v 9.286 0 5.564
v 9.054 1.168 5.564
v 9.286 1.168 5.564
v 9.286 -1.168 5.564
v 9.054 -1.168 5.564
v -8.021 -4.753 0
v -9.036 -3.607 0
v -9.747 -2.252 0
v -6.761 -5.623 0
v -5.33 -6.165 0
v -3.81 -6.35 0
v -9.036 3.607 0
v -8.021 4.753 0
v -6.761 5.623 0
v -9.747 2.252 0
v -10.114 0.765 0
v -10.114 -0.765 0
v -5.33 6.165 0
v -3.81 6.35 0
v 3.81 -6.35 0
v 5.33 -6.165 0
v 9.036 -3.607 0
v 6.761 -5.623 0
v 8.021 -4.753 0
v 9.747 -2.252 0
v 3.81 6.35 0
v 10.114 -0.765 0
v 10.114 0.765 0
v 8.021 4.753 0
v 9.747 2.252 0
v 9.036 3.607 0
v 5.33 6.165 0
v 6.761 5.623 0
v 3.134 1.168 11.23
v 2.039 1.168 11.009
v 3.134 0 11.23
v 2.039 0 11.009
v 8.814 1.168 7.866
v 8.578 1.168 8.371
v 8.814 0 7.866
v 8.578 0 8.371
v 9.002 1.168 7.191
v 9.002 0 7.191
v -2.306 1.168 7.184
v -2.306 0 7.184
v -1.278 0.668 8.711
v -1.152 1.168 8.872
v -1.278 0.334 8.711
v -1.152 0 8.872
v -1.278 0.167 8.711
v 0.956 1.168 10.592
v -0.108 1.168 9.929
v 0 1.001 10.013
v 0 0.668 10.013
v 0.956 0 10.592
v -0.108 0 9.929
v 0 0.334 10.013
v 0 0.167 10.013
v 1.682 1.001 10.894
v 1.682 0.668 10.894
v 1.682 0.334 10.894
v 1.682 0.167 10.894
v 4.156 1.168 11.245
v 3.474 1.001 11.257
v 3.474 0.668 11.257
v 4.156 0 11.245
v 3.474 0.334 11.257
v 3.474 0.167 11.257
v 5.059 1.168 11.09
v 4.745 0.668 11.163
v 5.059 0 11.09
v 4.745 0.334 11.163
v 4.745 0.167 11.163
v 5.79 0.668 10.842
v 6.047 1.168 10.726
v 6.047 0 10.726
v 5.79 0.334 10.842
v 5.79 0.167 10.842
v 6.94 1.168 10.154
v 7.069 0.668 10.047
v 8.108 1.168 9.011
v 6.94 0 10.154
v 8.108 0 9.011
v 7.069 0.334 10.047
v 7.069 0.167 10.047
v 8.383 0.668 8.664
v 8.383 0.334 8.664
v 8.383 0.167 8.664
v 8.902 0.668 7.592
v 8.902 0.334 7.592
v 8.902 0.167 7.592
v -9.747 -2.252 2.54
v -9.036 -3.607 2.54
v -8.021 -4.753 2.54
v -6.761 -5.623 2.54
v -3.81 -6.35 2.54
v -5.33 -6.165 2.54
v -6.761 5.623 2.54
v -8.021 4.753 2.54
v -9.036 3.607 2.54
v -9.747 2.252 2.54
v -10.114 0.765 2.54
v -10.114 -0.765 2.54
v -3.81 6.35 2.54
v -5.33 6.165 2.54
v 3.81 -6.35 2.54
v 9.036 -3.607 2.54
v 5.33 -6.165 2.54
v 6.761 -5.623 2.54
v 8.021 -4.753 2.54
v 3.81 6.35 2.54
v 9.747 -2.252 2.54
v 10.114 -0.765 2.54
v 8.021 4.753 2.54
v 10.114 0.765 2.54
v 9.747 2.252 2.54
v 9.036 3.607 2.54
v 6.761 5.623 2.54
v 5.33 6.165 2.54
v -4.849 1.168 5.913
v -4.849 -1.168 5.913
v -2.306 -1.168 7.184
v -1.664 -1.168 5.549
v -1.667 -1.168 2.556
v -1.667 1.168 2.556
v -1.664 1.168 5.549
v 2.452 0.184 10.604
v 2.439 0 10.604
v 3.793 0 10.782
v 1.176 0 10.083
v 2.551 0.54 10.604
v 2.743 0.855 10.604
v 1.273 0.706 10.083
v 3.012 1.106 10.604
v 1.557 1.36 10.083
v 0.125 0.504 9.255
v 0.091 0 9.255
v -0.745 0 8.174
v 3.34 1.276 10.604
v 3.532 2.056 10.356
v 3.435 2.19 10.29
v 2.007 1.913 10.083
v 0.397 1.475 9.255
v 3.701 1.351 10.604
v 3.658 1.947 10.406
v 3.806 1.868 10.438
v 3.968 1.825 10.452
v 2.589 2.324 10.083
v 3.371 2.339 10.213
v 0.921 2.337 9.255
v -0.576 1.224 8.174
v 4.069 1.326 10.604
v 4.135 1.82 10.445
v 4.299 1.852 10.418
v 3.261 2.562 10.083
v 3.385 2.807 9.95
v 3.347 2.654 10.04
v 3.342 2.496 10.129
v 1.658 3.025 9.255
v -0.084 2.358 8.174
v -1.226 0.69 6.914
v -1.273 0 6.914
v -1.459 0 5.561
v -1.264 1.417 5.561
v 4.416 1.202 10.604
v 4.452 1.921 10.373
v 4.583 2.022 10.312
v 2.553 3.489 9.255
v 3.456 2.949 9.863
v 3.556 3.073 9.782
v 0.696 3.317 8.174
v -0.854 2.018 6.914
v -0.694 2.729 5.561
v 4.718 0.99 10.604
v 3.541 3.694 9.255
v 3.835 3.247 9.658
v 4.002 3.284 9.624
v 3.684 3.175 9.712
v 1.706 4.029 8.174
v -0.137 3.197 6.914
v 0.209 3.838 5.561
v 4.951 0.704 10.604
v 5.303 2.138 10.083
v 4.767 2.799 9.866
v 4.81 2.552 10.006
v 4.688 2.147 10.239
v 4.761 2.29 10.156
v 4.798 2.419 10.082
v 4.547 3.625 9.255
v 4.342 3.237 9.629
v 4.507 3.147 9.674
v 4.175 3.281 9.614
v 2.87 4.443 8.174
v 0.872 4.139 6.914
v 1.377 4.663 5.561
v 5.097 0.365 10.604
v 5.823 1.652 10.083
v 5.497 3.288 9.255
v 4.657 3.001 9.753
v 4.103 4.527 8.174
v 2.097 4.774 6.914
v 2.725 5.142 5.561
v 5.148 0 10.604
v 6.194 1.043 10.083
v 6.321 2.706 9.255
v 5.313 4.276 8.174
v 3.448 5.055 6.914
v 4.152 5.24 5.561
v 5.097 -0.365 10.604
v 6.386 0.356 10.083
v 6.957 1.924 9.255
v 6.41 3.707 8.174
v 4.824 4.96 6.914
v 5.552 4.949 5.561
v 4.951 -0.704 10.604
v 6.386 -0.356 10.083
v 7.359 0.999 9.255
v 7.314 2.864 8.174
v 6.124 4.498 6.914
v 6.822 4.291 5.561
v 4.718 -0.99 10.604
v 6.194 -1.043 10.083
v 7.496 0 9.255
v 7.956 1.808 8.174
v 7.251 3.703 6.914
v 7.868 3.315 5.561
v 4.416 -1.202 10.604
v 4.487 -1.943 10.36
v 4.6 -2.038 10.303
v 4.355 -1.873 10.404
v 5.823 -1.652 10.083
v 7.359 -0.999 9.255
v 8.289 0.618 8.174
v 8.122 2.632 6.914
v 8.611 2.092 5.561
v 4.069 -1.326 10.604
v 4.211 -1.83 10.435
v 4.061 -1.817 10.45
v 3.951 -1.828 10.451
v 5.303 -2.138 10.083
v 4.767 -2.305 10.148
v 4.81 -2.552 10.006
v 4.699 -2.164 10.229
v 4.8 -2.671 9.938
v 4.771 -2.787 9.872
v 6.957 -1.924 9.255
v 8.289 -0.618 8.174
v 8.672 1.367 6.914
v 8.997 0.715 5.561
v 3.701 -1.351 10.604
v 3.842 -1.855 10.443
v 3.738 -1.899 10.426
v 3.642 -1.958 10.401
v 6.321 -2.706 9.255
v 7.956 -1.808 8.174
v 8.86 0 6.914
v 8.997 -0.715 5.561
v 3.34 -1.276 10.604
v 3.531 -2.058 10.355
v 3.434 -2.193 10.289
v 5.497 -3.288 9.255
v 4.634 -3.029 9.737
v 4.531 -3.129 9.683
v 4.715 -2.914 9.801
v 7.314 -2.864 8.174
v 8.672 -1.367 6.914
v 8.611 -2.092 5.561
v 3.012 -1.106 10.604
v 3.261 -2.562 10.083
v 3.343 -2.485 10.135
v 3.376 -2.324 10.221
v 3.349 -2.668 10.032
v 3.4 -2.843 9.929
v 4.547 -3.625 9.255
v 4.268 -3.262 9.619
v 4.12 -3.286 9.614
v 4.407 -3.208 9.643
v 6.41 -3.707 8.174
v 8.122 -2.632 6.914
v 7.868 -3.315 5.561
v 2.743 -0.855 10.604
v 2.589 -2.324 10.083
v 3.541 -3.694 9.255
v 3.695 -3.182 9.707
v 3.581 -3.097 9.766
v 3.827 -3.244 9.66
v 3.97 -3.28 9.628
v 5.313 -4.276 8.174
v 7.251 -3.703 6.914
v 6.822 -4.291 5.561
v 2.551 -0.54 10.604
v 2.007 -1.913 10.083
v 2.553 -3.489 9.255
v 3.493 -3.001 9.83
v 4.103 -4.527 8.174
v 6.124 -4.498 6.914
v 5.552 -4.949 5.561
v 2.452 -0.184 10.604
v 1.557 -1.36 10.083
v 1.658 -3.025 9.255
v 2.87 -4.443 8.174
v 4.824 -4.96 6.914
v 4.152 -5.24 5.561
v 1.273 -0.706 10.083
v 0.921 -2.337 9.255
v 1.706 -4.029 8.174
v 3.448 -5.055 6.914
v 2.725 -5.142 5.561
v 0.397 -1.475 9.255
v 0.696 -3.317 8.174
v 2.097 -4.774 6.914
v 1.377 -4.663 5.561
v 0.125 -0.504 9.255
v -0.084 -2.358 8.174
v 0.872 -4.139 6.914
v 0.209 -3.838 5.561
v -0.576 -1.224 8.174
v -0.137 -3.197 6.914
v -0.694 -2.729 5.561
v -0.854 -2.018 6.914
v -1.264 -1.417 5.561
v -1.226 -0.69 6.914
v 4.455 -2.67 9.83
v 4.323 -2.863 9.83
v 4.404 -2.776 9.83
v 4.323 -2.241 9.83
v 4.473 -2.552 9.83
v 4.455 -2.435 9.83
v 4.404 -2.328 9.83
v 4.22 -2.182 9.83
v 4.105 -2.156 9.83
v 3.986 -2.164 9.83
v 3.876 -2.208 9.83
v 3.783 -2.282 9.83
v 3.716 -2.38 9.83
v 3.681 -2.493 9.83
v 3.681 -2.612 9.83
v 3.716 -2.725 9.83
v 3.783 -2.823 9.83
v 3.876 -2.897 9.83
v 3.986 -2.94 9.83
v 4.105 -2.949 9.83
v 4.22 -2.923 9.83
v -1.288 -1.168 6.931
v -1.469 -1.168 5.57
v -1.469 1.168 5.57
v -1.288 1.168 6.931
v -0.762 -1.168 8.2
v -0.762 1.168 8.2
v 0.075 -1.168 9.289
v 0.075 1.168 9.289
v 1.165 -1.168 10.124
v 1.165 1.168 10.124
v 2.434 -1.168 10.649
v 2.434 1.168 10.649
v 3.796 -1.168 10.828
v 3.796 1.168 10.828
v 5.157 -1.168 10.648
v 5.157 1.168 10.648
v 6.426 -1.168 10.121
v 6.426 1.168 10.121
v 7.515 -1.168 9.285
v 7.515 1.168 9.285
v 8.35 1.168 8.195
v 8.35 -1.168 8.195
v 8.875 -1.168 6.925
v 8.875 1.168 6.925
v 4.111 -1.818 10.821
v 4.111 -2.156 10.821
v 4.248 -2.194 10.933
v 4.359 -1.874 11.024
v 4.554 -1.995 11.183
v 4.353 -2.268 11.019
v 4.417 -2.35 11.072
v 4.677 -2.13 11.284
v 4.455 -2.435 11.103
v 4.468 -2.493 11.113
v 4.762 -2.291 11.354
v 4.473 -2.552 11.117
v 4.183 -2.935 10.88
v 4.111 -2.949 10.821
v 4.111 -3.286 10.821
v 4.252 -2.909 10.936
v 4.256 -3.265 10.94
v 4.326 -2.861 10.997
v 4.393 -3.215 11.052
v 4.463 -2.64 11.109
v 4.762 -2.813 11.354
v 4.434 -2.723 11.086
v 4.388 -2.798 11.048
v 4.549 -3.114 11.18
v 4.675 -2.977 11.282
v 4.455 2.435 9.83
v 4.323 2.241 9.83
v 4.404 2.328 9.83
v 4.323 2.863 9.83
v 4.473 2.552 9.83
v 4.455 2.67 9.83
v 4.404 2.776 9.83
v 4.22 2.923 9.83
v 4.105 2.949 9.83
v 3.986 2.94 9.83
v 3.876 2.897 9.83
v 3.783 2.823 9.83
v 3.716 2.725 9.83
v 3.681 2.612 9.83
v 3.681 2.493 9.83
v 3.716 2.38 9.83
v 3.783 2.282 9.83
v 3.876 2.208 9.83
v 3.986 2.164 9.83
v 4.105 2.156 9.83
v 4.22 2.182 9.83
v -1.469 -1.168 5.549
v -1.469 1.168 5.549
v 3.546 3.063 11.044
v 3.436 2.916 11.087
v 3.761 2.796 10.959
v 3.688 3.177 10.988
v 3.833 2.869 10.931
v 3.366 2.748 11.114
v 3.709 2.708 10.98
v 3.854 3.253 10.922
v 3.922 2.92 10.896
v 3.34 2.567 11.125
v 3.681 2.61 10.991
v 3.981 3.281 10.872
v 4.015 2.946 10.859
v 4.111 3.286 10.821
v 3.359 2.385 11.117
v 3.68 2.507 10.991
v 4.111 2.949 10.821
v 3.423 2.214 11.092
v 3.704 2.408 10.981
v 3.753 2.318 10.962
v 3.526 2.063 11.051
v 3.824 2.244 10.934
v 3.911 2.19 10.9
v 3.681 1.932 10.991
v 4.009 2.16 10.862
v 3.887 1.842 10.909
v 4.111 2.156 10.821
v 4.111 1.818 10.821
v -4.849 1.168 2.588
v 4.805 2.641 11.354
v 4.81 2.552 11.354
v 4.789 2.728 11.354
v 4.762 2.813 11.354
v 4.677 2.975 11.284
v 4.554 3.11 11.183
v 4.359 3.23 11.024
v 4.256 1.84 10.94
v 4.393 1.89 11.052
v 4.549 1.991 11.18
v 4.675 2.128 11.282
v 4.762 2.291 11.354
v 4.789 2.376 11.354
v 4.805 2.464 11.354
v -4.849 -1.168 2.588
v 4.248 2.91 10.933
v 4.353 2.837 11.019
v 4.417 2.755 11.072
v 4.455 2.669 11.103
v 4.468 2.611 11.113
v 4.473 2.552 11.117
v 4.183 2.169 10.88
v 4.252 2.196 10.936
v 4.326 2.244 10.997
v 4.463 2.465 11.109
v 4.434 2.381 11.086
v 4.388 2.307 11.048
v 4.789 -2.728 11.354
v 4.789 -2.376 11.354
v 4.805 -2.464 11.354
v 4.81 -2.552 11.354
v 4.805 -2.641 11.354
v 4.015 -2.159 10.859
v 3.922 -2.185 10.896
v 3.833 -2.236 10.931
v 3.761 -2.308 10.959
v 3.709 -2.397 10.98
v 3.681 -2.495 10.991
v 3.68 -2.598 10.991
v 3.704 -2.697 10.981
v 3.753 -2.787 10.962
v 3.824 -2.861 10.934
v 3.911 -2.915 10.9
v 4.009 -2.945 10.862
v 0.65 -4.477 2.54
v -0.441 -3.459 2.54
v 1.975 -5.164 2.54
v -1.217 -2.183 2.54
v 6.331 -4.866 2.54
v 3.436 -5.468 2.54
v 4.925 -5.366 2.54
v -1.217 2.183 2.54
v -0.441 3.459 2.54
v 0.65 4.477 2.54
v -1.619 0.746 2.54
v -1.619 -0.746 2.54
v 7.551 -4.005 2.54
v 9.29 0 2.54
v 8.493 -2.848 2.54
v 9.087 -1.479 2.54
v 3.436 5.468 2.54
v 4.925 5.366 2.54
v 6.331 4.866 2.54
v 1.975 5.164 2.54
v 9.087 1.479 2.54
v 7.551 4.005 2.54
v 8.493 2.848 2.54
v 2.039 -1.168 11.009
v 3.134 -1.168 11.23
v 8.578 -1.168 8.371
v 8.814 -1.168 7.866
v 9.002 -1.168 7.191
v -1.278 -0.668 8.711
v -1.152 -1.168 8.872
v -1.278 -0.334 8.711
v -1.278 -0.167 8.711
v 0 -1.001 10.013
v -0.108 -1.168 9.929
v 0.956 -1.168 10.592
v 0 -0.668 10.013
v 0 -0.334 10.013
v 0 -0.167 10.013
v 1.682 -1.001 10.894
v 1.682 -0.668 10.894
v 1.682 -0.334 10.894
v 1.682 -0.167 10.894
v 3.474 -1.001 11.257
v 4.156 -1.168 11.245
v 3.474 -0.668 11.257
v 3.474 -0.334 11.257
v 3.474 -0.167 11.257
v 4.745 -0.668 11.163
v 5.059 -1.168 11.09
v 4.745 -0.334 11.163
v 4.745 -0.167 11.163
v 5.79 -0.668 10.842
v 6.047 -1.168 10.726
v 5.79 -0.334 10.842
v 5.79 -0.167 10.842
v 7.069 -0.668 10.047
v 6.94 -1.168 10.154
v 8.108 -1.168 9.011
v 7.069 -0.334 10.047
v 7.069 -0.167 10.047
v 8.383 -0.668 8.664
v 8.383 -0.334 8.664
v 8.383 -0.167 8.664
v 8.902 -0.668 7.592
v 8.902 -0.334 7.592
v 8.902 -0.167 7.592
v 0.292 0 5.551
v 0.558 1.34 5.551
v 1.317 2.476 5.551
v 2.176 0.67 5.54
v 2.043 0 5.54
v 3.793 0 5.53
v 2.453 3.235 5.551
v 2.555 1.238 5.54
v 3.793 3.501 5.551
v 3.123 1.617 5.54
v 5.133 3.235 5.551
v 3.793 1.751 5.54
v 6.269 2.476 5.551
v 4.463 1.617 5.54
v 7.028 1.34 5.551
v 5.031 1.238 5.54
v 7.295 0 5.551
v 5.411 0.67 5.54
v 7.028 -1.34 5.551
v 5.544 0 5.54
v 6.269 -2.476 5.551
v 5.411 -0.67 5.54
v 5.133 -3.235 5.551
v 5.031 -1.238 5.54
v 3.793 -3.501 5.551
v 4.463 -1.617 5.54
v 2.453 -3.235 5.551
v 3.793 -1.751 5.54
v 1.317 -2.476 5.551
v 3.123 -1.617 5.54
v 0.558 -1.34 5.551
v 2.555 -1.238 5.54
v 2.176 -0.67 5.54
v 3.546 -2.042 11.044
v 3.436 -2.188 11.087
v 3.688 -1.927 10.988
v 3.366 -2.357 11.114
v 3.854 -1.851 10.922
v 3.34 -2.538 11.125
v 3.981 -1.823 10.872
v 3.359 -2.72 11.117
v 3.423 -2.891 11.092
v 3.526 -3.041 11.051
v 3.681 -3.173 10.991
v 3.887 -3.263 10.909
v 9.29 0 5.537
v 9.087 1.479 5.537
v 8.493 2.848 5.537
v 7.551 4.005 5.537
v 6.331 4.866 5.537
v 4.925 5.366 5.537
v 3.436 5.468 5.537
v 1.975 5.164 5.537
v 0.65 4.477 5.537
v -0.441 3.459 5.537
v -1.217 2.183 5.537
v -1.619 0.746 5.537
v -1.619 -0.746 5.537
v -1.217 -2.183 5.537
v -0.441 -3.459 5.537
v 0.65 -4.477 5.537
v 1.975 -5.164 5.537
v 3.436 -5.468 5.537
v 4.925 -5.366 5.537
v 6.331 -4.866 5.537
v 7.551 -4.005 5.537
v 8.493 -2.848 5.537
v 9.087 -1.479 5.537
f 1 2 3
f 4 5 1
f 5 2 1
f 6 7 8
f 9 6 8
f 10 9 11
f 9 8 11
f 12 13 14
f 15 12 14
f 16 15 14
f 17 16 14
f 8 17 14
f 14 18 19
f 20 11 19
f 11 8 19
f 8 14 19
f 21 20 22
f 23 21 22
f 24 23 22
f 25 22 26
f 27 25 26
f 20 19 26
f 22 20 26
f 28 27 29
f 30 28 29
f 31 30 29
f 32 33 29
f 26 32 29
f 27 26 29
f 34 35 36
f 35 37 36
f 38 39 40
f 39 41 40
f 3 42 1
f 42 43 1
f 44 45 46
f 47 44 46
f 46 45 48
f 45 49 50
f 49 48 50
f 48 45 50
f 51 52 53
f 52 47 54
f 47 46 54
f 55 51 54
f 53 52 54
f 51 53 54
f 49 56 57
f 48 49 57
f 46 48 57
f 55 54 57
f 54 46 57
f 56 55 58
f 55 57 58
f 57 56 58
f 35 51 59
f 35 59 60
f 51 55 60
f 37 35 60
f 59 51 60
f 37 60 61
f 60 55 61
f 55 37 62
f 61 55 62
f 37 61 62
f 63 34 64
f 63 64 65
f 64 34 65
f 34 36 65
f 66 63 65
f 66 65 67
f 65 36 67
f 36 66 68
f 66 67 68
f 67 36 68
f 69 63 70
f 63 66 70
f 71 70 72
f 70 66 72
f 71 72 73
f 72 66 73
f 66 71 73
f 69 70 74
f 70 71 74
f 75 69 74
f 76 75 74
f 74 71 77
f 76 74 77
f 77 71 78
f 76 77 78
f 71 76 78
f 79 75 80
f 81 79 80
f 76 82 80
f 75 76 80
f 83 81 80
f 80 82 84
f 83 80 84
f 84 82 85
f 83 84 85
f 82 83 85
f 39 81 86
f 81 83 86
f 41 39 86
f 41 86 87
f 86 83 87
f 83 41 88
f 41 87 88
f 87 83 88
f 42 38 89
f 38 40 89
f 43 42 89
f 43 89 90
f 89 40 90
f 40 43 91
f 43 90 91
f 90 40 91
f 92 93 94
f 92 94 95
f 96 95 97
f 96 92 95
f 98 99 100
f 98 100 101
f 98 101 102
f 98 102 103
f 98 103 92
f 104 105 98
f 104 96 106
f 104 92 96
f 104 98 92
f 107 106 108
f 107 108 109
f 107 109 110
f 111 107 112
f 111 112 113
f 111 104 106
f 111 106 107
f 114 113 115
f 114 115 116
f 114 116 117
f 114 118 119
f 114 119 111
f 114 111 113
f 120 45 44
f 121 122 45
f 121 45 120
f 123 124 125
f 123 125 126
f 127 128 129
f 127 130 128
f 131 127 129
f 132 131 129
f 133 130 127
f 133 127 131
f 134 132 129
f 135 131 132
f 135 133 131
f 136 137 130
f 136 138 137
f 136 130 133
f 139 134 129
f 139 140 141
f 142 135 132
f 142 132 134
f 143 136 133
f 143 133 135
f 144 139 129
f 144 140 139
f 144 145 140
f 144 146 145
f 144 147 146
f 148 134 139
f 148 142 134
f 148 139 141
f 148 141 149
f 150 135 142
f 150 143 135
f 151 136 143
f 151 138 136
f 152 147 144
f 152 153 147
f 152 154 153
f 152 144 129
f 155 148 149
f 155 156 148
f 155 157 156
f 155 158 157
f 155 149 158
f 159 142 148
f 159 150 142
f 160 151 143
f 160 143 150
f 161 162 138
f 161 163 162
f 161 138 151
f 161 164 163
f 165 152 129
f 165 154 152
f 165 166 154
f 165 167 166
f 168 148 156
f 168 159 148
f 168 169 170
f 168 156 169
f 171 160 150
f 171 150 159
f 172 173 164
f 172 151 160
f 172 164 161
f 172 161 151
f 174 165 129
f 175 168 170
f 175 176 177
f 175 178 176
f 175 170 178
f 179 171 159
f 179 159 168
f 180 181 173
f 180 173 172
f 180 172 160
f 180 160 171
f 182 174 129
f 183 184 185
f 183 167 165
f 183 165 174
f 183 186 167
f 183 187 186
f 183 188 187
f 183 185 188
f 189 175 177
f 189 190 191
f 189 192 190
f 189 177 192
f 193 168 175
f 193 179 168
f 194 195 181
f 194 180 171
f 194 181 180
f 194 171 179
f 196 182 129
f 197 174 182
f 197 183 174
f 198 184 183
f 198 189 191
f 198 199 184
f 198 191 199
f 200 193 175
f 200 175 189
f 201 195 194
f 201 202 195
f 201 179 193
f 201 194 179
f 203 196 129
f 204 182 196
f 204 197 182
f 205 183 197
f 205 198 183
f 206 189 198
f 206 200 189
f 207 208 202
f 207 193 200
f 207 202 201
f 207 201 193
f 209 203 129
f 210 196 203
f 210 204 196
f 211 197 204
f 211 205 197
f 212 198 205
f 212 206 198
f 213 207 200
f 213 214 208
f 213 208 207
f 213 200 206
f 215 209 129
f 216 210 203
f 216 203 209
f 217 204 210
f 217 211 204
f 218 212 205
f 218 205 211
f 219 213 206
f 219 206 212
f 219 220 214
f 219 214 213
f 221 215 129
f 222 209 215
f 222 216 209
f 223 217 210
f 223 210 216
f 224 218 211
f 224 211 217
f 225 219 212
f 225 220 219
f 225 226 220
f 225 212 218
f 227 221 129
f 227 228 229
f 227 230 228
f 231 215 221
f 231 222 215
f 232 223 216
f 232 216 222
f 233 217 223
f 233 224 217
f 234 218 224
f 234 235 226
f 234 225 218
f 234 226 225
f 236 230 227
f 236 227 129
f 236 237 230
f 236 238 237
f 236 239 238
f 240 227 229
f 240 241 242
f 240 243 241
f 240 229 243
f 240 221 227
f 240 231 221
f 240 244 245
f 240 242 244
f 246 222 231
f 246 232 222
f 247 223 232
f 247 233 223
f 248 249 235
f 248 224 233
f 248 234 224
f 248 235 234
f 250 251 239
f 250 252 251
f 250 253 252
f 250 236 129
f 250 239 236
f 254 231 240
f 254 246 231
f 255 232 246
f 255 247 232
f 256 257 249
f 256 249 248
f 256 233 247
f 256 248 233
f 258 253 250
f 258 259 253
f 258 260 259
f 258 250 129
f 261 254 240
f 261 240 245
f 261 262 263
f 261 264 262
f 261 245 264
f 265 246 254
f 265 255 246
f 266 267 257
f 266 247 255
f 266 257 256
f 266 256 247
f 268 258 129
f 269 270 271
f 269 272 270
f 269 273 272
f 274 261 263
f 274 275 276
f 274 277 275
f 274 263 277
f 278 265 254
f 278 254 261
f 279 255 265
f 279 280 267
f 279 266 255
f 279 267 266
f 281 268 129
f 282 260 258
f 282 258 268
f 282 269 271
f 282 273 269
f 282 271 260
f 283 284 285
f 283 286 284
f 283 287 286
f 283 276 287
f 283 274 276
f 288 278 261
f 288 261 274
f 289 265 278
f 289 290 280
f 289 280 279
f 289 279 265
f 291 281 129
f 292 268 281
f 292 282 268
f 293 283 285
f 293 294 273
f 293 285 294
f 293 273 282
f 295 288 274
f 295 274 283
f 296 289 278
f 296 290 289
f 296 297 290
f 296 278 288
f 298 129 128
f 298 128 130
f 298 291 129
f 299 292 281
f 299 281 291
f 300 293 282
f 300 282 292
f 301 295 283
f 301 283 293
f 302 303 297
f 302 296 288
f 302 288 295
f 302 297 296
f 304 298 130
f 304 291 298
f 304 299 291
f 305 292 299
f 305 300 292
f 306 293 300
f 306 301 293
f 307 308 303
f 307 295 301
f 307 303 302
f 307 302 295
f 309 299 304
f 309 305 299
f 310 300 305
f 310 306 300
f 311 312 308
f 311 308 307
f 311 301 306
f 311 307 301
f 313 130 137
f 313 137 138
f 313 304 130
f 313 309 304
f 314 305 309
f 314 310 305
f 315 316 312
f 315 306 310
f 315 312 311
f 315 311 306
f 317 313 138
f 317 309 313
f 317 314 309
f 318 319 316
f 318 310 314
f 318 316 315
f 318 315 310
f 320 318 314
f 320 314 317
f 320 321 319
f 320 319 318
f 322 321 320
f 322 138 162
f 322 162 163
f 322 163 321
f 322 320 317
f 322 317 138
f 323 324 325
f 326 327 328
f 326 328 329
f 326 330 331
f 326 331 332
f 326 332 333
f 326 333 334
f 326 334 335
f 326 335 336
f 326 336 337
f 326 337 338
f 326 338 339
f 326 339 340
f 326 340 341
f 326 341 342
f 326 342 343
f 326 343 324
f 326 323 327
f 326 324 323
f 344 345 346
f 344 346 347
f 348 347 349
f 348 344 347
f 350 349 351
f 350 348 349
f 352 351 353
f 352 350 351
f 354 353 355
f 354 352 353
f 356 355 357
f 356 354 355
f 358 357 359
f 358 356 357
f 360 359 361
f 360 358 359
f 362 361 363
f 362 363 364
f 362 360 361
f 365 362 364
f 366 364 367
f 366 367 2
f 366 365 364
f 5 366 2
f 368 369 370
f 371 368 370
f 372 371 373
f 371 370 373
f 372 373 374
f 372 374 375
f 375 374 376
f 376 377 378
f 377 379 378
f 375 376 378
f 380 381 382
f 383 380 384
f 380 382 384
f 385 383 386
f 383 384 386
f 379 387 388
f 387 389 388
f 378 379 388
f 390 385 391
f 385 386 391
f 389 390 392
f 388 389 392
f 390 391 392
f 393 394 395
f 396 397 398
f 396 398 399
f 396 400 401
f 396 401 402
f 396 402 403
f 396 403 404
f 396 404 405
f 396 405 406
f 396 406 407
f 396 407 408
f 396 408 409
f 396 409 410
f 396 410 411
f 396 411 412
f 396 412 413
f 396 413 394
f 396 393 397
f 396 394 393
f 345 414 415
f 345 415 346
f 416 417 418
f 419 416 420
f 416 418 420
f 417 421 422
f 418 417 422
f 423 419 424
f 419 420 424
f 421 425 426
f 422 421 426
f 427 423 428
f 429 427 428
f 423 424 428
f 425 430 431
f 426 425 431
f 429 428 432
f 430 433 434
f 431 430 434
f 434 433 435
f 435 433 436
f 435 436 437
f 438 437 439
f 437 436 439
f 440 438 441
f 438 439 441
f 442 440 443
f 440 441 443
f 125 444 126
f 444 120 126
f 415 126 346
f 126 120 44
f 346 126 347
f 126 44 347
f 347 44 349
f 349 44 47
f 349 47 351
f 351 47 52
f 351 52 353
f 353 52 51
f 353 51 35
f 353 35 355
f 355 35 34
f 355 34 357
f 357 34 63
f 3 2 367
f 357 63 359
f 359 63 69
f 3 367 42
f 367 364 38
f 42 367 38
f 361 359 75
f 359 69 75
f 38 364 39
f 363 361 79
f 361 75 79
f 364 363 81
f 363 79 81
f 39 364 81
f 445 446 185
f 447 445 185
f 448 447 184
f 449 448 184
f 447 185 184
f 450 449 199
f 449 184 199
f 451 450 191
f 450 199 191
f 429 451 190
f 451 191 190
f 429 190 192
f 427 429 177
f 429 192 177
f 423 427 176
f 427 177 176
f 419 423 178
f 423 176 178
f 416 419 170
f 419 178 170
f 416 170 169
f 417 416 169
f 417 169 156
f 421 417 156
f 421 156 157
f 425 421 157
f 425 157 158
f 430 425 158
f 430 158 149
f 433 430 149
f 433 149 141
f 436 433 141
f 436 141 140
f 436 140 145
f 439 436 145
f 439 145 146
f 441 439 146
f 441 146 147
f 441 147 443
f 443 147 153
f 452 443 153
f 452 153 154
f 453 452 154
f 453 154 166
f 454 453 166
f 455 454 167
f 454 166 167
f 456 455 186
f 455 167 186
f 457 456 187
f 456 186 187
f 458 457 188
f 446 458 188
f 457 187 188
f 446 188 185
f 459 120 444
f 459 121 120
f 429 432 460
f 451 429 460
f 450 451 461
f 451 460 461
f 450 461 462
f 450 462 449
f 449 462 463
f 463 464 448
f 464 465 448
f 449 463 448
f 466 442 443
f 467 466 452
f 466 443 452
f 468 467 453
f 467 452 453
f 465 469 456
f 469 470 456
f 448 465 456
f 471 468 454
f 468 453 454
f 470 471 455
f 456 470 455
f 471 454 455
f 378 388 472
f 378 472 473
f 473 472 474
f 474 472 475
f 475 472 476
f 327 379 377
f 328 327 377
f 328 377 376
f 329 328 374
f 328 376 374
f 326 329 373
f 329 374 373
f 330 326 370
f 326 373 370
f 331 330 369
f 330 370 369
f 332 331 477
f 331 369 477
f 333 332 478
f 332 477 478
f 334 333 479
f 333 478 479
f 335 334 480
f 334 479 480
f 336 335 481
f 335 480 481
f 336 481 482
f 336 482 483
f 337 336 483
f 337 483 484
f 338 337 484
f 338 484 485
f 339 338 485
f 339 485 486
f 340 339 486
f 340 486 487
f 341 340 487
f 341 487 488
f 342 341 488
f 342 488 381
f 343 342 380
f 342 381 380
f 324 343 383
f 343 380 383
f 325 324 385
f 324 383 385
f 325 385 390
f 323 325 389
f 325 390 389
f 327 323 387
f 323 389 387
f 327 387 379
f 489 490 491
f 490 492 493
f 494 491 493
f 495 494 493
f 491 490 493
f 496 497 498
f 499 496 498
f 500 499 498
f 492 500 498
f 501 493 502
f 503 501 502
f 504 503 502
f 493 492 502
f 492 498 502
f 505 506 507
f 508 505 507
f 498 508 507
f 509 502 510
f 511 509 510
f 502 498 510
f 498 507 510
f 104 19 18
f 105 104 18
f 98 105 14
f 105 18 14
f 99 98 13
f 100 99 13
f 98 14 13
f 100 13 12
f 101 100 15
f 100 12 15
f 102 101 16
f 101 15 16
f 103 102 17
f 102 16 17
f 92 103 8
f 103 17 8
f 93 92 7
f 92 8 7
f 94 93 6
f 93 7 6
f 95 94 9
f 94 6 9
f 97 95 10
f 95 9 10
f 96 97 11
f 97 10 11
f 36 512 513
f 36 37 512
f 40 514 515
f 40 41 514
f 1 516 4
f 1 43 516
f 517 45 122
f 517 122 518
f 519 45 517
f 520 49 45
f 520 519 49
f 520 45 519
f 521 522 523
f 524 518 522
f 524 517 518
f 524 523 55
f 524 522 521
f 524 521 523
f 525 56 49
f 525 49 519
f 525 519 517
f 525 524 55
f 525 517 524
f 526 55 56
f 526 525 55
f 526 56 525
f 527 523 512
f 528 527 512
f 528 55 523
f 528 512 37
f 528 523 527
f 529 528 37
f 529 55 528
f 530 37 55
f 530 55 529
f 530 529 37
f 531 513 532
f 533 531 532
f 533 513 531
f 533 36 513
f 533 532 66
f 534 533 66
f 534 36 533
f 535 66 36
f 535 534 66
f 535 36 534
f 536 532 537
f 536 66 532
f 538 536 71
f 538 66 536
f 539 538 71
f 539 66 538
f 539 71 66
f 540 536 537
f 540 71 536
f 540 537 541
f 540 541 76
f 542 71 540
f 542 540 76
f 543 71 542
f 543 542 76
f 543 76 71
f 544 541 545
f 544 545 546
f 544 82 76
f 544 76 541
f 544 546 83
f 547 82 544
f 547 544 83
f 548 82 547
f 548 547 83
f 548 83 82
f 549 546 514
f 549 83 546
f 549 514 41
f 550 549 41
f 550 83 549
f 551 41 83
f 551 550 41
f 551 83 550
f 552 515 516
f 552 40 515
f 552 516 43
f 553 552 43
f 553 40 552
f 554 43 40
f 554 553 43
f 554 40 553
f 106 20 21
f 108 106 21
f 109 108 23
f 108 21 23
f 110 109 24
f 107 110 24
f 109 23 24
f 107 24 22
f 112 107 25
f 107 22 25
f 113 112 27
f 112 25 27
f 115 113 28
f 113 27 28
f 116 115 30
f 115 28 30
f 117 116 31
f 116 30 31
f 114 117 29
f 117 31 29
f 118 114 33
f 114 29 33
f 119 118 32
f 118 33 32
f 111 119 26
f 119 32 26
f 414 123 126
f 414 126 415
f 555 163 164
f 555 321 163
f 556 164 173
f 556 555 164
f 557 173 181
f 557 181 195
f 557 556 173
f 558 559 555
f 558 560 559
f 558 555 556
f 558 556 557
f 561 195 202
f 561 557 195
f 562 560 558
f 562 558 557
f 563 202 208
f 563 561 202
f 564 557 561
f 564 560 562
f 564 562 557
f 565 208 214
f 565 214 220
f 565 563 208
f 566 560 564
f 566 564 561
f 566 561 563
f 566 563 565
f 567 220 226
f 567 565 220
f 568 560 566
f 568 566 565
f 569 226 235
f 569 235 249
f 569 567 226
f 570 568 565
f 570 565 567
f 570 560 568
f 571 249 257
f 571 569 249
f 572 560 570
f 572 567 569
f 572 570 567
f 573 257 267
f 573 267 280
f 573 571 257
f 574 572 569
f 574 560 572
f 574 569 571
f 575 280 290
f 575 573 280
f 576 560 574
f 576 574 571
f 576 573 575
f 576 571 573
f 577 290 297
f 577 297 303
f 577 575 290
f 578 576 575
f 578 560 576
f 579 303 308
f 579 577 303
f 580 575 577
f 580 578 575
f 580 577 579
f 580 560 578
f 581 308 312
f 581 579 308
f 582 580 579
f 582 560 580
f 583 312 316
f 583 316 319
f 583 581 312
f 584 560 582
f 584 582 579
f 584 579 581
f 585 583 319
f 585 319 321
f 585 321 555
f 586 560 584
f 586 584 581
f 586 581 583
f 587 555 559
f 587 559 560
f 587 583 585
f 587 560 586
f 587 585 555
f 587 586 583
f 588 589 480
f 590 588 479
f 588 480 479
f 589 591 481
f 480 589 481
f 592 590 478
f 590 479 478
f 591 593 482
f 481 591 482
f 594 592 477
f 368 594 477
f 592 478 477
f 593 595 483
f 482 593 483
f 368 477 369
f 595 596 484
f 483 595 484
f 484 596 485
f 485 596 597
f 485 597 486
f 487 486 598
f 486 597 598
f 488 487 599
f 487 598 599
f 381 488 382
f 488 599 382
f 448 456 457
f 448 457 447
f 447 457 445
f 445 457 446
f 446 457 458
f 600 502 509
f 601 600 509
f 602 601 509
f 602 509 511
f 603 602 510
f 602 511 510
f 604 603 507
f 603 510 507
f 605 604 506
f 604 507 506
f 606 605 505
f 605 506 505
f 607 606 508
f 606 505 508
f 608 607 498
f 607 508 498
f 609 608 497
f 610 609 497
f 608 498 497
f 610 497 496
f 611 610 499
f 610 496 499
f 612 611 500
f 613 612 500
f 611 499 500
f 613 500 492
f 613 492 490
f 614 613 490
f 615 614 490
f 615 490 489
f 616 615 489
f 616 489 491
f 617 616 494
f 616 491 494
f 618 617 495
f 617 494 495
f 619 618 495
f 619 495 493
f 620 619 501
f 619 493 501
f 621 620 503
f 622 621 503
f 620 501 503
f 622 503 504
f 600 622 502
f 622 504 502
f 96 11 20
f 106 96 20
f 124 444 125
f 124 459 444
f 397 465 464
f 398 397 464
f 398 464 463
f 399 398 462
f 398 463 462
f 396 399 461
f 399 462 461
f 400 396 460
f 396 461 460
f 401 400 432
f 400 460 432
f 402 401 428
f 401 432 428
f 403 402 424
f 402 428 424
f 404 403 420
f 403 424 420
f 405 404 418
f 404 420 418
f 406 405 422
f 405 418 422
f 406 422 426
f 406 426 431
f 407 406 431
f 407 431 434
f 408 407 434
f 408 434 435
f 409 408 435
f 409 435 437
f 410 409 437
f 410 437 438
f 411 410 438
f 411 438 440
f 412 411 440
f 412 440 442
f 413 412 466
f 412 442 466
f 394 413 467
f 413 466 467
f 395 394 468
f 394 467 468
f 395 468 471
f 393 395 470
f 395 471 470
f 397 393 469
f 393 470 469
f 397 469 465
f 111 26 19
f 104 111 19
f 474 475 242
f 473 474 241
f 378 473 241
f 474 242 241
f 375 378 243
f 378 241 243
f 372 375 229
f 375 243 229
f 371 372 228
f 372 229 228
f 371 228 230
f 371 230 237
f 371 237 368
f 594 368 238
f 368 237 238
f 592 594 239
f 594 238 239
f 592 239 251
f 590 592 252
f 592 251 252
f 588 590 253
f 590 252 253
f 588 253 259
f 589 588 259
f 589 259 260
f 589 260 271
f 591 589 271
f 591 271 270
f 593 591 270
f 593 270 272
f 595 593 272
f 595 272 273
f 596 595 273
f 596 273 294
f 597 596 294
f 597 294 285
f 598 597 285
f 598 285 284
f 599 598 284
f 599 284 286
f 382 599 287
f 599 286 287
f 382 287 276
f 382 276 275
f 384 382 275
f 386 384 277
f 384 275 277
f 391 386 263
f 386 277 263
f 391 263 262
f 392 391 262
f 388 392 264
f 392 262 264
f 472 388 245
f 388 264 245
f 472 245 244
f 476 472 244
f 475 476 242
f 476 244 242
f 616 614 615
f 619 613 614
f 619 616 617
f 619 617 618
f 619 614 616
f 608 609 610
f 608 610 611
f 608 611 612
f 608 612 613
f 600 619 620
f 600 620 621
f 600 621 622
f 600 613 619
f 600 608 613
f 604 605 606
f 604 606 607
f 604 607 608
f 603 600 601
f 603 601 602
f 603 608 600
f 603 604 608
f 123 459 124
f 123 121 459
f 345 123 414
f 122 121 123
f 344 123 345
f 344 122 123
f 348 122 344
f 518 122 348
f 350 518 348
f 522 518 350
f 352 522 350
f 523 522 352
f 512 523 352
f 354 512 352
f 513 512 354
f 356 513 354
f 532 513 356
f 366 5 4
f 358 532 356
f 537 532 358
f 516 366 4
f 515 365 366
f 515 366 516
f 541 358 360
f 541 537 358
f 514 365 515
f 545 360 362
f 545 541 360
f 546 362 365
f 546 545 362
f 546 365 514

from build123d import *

# Parameters (mm, degrees)
F1_DEPTH  = 2.54
F2_R      = 5.4804135952
F3_DEPTH  = 2.9972
F7_DEPTH  = 1.1684
F9_R      = 0.7350598137
F10_DEPTH = 1.778
F11_R     = 0.3979192026
F12_DEPTH = 1.524
F15_DEPTH = 7.0866


with BuildPart() as f1:
    # F0 (on Top) → F1 (new body)
    with BuildSketch(Plane.XY):
        with BuildLine():
            Line((3.81, 6.35), (-3.81, 6.35))
            ThreePointArc((-3.81, 6.35), (-10.16, 0), (-3.81, -6.35))
            Line((-3.81, -6.35), (3.81, -6.35))
            ThreePointArc((3.81, -6.35), (10.16, 0), (3.81, 6.35))
        make_face()
    extrude(amount=F1_DEPTH)


with BuildPart() as f3:
    # F2 (on face) → F3 (new body)
    with BuildSketch(Plane.XY.offset(2.54)):
        with Locations((3.81, 0)):
            Circle(F2_R)
    extrude(amount=F3_DEPTH)


with BuildPart() as f5:
    # F4 (on Front) → F5 (revolve)
    with BuildSketch(Plane.XZ):
        with BuildLine():
            Line((3.7933739368, 5.5296733044), (3.7933739368, 10.781909572))
            ThreePointArc((3.7933739368, 10.781909572), (0.0906030305, 9.2546529588), (-1.4587684225, 5.5610810767))
            Line((-1.4587684225, 5.5610810767), (3.7933739368, 5.5296733044))
        make_face()
    revolve(axis=Axis((3.7933739368, 0, 8.1557914382), (0, 0, -1)))

    # F9 (on offset) → F10 (join)
    with BuildSketch(Plane.XY.offset(9.5758)):
        with Locations((4.0749050677, 2.5523174554)):
            Circle(F9_R)
        with Locations((4.0749050677, -2.5523174554)):
            Circle(F9_R)
    extrude(amount=F10_DEPTH)

    # F11 (on face) → F12 (cut)
    with BuildSketch(Plane.XY.offset(11.3538)):
        with Locations((4.0749050677, -2.5523174554)):
            Circle(F11_R)
        with Locations((4.0749050677, 2.5523174554)):
            Circle(F11_R)
    extrude(amount=-F12_DEPTH, mode=Mode.SUBTRACT)


with BuildPart() as f7:
    # F6 (on Front) → F7 (new body, symmetric)
    with BuildSketch(Plane.XZ):
        with BuildLine():
            Line((-4.8488308676, 2.587988507), (-1.6671707854, 2.5555151515))
            Line((-1.6671707854, 2.5555151515), (-1.6638021916, 5.5491072126))
            Line((-1.6638021916, 5.5491072126), (-1.4685010538, 5.5488874464))
            Line((-1.4685010538, 5.5488874464), (-1.4685010538, 5.5696652271))
            ThreePointArc((-1.4685010538, 5.5696652271), (3.7956221495, 10.8277949039), (9.0537518263, 5.5636717007))
            Line((9.0537518263, 5.5636717007), (9.2857042328, 5.5636717007))
            add(Edge.make_bspline(
                [(-2.306267852, 7.1841594763), (-1.6486831843, 8.2271512611), (-0.3298960757, 10.318872963), (3.3954517777, 11.5555770619), (5.8113106779, 10.9362546506), (7.0758411721, 10.1294418033), (8.4639189734, 8.6900865807), (8.9699038236, 7.6097738923), (9.1712581853, 6.3051789998), (9.2857042328, 5.5636717007)],
                knots=[0, 0, 0, 0, 0.1819080402, 0.3648168673, 0.5108915852, 0.6277563048, 0.7592698915, 0.8631735157, 1, 1, 1, 1], degree=3))
            Line((-2.306267852, 7.1841594763), (-4.8488308676, 5.9128780849))
            Line((-4.8488308676, 5.9128780849), (-4.8488308676, 2.587988507))
        make_face()
    extrude(amount=F7_DEPTH, both=True)


with BuildPart() as f15:
    # F14 (on offset) → F15 (new body, symmetric)
    with BuildSketch(Plane.XZ.offset(2.54)):
        Polygon((4.1112513281, 10.8212800696), (4.7835633159, 11.3713536412), (3.3220620826, 11.3955037668), (3.3220620826, 11.1317811604), align=None)
    extrude(amount=F15_DEPTH, both=True)


with BuildPart() as f5_1:
    add(f5.part)

    # F16: cut F15
    add(f15.part, mode=Mode.SUBTRACT)


solid = Compound([f1.part, f3.part, f7.part, f5_1.part])
